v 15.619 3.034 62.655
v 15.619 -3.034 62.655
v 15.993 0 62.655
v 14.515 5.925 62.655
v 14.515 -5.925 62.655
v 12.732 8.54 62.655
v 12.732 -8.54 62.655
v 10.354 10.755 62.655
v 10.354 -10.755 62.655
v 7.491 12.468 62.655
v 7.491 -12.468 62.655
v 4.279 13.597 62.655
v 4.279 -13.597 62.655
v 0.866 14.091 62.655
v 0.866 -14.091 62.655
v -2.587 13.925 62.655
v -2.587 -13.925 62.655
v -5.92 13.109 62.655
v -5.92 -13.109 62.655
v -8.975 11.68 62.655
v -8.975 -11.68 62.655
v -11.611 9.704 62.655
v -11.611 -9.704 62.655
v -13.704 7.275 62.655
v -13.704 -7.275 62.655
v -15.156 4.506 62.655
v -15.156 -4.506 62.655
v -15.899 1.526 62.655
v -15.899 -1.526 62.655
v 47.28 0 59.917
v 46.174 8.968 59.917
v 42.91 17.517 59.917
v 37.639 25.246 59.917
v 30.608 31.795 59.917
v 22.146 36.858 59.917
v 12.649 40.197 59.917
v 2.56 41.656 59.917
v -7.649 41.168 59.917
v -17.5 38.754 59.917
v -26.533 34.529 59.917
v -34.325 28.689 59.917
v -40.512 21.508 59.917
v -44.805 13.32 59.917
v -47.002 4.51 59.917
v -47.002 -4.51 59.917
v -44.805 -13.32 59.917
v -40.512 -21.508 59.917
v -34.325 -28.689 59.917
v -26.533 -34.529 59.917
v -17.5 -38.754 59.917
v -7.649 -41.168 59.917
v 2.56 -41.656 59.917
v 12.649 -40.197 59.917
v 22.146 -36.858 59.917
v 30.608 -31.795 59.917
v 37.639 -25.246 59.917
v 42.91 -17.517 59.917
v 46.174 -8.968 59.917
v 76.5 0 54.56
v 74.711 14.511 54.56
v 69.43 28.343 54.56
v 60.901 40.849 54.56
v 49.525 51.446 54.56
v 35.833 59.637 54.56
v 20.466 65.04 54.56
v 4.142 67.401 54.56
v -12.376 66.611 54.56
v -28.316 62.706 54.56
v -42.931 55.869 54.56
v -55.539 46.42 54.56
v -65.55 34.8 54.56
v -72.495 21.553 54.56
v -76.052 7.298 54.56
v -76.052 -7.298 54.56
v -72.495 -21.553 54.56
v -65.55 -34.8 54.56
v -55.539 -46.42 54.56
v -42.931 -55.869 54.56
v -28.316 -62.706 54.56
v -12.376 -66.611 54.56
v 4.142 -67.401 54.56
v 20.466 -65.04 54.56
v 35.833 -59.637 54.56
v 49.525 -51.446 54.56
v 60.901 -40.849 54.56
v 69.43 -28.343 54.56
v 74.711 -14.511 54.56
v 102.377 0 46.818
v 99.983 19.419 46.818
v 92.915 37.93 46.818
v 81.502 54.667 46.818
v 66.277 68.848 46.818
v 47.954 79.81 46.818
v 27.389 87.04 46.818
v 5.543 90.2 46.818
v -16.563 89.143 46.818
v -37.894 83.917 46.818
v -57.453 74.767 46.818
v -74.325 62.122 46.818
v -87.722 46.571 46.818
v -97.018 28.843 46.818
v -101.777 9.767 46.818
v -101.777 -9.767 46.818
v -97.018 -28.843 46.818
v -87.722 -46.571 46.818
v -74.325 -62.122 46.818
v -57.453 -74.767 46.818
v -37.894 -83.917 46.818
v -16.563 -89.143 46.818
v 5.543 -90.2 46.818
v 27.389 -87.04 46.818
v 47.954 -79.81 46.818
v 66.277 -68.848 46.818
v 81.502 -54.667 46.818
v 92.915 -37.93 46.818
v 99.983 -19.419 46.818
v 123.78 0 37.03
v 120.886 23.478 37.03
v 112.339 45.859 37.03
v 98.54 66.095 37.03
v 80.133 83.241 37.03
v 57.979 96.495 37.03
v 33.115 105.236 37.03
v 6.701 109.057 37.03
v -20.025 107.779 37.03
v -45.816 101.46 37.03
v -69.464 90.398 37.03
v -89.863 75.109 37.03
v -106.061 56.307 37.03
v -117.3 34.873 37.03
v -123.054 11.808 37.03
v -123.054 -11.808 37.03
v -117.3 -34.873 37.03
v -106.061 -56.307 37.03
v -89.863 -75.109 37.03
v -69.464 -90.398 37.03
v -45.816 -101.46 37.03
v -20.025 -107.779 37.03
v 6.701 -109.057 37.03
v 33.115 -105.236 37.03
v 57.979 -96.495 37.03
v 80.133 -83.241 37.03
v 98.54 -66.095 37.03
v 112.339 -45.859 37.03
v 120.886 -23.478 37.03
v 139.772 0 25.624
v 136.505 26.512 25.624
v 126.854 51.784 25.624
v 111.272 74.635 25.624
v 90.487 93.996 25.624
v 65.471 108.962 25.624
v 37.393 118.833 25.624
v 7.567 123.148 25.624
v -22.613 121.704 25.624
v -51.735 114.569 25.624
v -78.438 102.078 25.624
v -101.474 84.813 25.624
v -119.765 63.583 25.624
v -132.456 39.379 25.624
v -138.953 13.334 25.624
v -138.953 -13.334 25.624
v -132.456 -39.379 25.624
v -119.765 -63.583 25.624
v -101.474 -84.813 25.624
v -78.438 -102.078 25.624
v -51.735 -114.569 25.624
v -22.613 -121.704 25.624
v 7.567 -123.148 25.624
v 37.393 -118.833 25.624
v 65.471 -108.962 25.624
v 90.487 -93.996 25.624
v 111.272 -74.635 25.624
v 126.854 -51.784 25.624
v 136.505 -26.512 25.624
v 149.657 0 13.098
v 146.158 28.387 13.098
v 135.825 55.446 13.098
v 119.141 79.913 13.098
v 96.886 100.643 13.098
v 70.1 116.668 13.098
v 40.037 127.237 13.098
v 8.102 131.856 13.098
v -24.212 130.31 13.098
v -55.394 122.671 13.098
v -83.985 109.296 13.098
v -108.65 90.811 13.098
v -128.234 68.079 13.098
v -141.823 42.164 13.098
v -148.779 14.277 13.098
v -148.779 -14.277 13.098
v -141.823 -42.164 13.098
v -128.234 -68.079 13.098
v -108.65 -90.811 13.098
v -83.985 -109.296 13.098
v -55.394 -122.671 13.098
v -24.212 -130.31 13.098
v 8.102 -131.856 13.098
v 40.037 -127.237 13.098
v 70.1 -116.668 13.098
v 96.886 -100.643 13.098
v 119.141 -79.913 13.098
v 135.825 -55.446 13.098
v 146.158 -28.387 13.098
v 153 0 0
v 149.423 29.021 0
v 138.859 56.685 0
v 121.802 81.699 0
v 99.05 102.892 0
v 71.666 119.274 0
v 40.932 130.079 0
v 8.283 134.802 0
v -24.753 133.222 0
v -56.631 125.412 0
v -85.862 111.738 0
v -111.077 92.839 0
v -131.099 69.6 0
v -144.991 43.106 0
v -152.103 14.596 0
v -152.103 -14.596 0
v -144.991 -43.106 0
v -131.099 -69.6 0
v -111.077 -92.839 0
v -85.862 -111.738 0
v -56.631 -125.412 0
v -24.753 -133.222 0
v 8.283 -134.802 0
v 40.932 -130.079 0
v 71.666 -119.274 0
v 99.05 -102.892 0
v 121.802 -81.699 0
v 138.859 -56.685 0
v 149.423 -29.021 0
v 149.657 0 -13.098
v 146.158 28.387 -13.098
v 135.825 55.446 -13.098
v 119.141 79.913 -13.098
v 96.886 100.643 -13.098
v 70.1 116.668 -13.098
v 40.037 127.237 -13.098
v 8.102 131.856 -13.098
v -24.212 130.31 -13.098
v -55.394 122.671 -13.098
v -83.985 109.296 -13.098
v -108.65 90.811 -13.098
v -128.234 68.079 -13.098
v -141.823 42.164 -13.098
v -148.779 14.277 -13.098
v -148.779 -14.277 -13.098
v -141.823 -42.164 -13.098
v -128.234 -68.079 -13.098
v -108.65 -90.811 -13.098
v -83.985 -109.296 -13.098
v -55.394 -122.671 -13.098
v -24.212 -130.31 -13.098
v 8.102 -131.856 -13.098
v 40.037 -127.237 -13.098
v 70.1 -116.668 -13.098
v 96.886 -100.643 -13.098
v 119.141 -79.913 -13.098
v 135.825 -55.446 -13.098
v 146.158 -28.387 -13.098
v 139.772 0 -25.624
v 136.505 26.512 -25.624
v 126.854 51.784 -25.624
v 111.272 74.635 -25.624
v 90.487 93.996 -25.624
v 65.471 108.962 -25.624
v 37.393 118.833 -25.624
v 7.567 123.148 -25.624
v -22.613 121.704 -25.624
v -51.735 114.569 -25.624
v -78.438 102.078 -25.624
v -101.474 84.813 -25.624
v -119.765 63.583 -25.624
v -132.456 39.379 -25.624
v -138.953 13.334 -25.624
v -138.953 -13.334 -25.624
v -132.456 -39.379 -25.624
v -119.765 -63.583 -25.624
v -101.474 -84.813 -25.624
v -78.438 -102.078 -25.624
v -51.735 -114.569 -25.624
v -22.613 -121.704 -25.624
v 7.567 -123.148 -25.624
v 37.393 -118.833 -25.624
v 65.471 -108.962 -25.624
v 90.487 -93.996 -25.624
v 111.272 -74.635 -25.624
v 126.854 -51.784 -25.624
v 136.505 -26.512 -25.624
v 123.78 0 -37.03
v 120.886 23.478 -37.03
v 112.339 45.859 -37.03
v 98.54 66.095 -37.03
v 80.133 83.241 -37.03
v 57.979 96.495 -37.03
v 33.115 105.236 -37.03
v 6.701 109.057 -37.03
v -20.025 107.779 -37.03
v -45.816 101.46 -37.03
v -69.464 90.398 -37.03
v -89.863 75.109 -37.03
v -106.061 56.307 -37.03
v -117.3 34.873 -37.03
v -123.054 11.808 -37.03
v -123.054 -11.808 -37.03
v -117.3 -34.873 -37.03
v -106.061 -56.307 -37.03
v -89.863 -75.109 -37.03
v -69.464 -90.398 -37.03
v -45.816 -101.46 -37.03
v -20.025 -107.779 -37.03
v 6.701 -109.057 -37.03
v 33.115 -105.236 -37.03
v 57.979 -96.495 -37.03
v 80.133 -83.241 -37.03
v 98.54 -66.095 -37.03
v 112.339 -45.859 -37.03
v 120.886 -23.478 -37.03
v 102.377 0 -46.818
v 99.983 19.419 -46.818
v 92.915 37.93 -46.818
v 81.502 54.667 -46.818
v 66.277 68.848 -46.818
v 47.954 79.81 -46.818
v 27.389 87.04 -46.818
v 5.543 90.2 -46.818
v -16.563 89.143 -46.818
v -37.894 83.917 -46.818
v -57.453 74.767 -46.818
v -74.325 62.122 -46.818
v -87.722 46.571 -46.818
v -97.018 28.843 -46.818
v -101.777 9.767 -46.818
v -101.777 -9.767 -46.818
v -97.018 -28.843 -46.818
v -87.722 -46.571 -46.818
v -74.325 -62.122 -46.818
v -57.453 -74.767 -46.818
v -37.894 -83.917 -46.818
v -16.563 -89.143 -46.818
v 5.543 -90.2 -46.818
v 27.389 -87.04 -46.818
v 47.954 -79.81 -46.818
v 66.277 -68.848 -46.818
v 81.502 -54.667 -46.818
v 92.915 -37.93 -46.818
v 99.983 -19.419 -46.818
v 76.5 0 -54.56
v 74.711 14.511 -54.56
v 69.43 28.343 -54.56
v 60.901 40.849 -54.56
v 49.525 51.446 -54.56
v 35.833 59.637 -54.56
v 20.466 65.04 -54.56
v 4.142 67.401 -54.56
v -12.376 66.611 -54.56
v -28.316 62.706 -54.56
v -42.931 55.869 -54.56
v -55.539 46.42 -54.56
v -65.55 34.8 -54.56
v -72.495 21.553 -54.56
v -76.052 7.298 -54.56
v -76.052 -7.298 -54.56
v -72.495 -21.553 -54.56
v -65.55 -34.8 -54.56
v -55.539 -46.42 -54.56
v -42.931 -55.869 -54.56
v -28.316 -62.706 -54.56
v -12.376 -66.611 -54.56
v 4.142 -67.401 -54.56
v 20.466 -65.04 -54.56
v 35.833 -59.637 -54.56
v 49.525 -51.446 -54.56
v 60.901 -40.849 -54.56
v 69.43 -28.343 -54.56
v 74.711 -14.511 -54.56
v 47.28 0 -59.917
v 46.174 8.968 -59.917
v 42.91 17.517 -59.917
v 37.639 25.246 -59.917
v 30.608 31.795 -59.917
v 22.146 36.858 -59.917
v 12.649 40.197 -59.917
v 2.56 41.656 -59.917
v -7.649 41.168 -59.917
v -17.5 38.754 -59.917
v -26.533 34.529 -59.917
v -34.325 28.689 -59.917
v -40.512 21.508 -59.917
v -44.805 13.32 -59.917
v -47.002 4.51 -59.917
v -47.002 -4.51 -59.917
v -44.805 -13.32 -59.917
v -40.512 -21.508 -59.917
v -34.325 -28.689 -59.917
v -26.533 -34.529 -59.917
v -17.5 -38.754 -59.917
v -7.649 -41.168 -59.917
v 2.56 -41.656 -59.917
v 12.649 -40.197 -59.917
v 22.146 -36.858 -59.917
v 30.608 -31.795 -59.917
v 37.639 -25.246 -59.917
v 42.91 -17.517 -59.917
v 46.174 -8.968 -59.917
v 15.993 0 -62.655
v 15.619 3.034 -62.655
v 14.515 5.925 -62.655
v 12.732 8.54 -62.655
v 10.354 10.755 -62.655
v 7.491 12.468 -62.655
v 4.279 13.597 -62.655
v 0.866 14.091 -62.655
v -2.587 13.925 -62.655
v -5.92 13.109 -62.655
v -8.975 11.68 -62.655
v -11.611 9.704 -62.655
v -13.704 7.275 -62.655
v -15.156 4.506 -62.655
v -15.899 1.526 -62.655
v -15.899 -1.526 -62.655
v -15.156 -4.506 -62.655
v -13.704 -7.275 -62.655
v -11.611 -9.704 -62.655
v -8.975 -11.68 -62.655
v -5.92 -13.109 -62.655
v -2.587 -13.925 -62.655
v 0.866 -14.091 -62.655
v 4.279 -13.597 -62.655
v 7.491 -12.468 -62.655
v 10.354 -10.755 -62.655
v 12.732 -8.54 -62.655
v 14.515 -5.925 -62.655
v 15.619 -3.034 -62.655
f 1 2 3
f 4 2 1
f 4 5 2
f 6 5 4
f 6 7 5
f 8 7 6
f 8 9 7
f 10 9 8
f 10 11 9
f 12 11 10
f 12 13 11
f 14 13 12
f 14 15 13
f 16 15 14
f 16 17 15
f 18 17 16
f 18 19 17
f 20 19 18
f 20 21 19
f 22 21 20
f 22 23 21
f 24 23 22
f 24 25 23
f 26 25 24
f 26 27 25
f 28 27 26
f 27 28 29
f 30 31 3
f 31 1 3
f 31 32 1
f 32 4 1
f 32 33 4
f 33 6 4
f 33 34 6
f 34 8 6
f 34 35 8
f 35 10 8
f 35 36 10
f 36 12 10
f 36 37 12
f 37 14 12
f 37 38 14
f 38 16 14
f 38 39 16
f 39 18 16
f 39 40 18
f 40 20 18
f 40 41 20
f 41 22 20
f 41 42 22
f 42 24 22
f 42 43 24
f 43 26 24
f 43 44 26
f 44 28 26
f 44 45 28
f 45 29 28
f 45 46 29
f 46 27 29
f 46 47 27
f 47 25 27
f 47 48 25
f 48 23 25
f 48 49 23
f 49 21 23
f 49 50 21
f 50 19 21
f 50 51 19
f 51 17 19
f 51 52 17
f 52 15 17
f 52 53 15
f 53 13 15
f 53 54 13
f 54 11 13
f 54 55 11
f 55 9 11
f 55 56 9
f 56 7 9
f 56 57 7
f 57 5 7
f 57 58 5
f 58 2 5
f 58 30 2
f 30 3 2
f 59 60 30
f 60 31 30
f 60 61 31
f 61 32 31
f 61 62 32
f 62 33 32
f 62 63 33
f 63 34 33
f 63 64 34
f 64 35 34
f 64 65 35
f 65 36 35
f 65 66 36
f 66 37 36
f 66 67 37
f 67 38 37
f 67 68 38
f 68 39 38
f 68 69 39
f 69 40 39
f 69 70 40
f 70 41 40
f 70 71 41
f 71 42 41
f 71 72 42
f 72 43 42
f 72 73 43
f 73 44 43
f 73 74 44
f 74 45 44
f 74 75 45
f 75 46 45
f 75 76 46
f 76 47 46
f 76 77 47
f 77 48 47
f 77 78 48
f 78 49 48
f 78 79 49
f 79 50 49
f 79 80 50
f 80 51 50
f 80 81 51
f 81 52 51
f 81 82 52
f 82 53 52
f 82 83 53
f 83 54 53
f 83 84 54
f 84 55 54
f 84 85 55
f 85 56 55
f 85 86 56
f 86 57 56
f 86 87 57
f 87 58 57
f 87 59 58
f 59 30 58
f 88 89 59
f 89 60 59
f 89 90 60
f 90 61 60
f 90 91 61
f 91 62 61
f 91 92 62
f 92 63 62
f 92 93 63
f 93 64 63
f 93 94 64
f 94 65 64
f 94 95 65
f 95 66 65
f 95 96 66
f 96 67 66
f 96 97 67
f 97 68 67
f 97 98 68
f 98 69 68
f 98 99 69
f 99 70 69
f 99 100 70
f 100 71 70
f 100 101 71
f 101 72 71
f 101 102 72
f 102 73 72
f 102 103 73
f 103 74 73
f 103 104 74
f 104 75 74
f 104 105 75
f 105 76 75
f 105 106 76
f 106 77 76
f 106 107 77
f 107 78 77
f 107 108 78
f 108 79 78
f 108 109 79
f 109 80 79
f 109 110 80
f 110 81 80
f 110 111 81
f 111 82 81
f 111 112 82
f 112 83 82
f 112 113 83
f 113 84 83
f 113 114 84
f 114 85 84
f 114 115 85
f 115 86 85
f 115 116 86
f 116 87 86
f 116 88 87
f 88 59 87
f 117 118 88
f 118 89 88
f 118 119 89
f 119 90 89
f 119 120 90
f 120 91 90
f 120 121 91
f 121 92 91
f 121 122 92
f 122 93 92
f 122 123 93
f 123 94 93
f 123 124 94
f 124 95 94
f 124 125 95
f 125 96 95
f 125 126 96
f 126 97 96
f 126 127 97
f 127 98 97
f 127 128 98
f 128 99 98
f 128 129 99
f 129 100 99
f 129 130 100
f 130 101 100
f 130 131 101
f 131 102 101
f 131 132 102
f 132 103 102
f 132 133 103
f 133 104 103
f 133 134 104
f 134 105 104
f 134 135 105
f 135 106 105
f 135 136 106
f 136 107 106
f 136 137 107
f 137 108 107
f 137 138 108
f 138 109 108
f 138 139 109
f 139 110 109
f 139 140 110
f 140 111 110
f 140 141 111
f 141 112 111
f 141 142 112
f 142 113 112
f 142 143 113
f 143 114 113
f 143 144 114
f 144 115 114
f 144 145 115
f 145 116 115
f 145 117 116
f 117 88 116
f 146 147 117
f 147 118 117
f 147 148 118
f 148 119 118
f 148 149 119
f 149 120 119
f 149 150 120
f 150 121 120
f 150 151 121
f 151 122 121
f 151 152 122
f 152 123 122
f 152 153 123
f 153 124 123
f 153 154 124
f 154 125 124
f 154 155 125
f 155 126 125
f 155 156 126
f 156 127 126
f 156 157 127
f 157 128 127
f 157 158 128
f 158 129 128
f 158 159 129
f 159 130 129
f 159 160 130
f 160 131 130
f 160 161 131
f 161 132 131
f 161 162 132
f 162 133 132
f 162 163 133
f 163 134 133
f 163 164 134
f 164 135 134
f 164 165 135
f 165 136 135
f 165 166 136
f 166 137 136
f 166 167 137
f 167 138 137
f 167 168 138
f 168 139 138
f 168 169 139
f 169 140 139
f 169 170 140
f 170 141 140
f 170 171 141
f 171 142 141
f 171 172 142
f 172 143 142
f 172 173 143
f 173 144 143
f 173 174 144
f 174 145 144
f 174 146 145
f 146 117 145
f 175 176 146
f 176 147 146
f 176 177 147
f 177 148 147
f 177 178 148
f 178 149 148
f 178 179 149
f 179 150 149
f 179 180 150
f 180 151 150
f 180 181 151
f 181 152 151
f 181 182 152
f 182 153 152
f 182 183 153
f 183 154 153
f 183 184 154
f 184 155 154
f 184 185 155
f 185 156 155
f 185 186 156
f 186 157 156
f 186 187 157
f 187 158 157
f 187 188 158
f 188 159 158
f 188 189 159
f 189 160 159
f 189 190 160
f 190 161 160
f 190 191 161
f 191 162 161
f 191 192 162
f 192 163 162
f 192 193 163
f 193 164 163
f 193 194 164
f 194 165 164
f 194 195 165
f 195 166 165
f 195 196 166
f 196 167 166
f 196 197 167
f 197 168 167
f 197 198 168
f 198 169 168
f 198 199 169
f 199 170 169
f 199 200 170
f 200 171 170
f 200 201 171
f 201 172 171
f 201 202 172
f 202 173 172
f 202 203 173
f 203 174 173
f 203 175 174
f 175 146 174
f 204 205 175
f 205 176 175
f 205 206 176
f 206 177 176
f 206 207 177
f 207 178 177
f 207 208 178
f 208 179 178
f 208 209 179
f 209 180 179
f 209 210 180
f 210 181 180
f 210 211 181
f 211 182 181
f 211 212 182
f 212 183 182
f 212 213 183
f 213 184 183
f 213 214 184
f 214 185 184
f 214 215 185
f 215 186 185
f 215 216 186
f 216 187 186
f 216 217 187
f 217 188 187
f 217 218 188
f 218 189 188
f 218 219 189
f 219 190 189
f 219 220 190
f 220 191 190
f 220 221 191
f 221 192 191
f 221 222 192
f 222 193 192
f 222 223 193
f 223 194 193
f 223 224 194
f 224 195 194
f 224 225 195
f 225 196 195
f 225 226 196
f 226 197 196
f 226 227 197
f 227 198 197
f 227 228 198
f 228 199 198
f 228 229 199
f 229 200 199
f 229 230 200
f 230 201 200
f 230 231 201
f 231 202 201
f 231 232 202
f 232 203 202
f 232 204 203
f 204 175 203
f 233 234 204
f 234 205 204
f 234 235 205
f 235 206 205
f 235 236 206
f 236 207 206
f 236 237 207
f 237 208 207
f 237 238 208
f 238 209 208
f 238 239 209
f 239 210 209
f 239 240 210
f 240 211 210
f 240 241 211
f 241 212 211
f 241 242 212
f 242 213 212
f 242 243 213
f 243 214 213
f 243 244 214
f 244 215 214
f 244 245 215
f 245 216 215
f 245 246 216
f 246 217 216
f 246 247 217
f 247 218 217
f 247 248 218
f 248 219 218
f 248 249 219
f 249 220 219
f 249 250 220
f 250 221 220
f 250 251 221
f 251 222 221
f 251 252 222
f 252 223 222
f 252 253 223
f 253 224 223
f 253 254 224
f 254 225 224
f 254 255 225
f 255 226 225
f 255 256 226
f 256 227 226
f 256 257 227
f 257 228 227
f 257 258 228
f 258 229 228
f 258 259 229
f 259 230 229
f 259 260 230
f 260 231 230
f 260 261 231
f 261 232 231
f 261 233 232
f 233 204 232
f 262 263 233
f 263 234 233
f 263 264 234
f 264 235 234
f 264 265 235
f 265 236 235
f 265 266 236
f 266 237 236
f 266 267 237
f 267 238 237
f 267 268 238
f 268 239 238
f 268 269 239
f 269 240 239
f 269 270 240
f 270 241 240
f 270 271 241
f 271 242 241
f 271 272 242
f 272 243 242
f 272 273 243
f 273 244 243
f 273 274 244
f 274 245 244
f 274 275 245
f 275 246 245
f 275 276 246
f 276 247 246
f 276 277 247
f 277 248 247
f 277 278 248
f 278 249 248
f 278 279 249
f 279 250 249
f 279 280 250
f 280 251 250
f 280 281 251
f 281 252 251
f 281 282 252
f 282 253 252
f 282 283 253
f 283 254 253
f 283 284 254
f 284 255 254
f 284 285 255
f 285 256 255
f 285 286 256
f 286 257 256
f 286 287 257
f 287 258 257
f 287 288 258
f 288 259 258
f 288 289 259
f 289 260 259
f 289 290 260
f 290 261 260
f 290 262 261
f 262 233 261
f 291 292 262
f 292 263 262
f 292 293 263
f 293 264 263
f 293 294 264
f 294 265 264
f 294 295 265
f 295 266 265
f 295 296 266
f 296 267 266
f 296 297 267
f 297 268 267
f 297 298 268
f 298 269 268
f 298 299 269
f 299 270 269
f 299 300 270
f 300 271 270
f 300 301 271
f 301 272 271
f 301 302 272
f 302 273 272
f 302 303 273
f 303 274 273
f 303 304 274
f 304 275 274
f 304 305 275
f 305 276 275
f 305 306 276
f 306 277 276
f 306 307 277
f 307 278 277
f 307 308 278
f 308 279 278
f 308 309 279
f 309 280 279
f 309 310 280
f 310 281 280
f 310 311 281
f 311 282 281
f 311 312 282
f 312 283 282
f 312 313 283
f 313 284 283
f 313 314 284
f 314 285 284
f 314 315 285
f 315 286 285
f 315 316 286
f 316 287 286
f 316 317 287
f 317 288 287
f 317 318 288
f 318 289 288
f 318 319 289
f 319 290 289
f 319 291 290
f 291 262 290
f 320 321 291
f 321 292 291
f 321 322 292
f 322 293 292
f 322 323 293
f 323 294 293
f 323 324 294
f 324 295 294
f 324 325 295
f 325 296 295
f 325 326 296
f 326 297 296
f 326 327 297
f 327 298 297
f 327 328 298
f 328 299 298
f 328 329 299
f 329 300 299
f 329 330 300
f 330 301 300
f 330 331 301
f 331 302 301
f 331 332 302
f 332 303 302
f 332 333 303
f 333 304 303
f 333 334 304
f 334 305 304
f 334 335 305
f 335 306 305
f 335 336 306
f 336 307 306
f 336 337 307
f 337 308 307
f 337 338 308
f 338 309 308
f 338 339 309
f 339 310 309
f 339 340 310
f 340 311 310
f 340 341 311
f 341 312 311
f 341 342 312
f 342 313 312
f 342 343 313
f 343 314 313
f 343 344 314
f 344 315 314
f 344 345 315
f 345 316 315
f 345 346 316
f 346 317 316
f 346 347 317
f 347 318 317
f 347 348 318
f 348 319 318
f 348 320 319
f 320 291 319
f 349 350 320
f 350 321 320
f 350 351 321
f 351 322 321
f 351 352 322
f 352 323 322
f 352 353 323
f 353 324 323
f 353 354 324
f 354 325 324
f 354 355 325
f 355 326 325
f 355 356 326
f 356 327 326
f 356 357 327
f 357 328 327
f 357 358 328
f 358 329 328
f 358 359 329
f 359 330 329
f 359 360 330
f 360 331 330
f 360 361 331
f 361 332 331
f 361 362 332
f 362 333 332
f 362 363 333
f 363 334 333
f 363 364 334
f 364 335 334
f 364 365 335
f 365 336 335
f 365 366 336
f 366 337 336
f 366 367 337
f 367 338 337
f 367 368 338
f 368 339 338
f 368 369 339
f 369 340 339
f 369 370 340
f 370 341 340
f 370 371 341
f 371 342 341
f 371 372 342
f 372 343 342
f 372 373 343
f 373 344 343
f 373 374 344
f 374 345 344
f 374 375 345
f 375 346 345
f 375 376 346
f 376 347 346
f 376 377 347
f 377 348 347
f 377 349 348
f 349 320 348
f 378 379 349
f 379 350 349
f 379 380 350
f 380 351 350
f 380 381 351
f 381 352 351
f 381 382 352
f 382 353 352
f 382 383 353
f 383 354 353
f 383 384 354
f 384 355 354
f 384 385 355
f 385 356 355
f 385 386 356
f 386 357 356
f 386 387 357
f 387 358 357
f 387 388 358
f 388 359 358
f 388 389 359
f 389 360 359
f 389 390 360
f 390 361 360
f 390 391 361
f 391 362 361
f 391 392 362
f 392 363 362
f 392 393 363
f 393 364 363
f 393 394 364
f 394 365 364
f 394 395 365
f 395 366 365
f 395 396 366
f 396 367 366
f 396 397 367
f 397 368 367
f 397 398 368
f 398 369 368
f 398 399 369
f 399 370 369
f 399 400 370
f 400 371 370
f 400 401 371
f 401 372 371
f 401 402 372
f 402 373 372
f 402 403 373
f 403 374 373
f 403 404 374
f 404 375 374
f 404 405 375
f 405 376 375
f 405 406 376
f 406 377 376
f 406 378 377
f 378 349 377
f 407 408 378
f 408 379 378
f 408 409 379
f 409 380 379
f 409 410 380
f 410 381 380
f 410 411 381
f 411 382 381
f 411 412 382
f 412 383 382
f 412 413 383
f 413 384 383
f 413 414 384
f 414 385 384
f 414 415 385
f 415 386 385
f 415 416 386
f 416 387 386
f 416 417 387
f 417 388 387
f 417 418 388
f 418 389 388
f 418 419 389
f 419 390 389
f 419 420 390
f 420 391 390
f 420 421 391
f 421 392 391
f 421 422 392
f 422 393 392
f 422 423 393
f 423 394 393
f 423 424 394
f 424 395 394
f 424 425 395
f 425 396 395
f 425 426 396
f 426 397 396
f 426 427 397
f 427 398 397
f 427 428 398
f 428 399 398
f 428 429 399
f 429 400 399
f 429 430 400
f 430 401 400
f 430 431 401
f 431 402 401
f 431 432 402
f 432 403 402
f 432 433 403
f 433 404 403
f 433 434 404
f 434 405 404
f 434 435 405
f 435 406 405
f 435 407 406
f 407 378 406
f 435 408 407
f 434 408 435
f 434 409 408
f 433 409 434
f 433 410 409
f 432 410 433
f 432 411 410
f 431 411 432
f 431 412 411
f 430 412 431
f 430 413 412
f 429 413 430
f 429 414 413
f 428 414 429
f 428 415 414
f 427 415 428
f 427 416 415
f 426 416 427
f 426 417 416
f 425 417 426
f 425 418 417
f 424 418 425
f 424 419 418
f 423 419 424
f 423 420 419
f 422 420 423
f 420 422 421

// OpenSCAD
// Generated by SolidPython 1.0.1 on 2020-07-29 00:46:53


scale(v = [17, 15, 7]) {
	sphere(r = 9);
}
/***********************************************
*********      SolidPython code:      **********
************************************************
 
# import packages: SolidPython
from solid import *
from solid.utils import *
from itertools import chain, combinations, permutations


class Resize:

    def __init__(self, scad_file):
        self.scad_file = scad_file
        #self.scad_file = import_scad(scad_file)
        # cone/cylinder param:
        self.r1 = 0
        self.r2 = 0
        self.h = 0
        # rectangular prism param:
        self.w = 0
        self.l = 0
        # ellipse param:
        self.r = 0

    # import OpenScad code (file name corresponds to shape)


    # classify shape + parameters
    def assign(self, param1, param2, param3):
        if self.scad_file == 'cone.scad':
            self.r1 = param1
            self.r2 = param2
            self.h = param3
        elif self.scad_file == 'cylinder.scad':
            self.r1 = param1
            self.r2 = param2
            self.h = param3
        elif self.scad_file == 'rectangularPrism.scad':
            self.h = param1
            self.l = param2
            self.w = param3
        else:
            self.r = param1
            self.h = param2

    # resize parameters
    def iterate(self):
        x = range(3, 20, 2)
        i = 1
        if self.scad_file == 'cone.scad':
            tempList = list(permutations(x, 2))
            for temp in tempList:
                param1 = temp[0]
                param2 = temp[1]
                filepath = 'produced_scad_files/' + 'cone' + str(param1) + '_' + str(param2) + '_' + '.scad'
                scad_render_to_file(cylinder(h=param1, r1=param2, r2=0), filepath)

        elif self.scad_file == 'cylinder.scad':
            tempList = list(permutations(x, 3))
            for temp in tempList:
                param1 = temp[0]
                param2 = temp[1]
                filepath = 'produced_scad_files/' + 'cylinder' + str(param1) + '_' + str(param2) + '_' + '.scad'
                scad_render_to_file(cylinder(h=param1, r1=param2, r2=param2), filepath)

        elif self.scad_file == 'rectangularPrism.scad':
            tempList = list(permutations(x, 3))
            for temp in tempList:
                param1 = temp[0]
                param2 = temp[1]
                param3 = temp[2]
                filepath = 'produced_scad_files/' + 'rectangularPrism' + str(param1) + '_' + str(param2) + '_' + str(
                    param3) + '.scad'
                scad_render_to_file(cube(size=(param1, param2, param3)), filepath)

        elif self.scad_file == 'ellipse.scad':
            tempList = list(permutations(x, 4))
            for temp in tempList:
                param1 = temp[0]
                param2 = temp[1]
                param3 = temp[2]
                param4 = temp[3]
                filepath = 'produced_scad_files/' + 'ellipse' + str(param1) + '_' + str(param2) + '_' + str(param3) + '_' + str(param4) + '.scad'
                scad_render_to_file(scale([param1, param2, param3])(sphere(r=param4)), filepath)

    def render_to_scadfile(self):
        scad_render_to_file(scad, 'example.scad') 
 
************************************************/
